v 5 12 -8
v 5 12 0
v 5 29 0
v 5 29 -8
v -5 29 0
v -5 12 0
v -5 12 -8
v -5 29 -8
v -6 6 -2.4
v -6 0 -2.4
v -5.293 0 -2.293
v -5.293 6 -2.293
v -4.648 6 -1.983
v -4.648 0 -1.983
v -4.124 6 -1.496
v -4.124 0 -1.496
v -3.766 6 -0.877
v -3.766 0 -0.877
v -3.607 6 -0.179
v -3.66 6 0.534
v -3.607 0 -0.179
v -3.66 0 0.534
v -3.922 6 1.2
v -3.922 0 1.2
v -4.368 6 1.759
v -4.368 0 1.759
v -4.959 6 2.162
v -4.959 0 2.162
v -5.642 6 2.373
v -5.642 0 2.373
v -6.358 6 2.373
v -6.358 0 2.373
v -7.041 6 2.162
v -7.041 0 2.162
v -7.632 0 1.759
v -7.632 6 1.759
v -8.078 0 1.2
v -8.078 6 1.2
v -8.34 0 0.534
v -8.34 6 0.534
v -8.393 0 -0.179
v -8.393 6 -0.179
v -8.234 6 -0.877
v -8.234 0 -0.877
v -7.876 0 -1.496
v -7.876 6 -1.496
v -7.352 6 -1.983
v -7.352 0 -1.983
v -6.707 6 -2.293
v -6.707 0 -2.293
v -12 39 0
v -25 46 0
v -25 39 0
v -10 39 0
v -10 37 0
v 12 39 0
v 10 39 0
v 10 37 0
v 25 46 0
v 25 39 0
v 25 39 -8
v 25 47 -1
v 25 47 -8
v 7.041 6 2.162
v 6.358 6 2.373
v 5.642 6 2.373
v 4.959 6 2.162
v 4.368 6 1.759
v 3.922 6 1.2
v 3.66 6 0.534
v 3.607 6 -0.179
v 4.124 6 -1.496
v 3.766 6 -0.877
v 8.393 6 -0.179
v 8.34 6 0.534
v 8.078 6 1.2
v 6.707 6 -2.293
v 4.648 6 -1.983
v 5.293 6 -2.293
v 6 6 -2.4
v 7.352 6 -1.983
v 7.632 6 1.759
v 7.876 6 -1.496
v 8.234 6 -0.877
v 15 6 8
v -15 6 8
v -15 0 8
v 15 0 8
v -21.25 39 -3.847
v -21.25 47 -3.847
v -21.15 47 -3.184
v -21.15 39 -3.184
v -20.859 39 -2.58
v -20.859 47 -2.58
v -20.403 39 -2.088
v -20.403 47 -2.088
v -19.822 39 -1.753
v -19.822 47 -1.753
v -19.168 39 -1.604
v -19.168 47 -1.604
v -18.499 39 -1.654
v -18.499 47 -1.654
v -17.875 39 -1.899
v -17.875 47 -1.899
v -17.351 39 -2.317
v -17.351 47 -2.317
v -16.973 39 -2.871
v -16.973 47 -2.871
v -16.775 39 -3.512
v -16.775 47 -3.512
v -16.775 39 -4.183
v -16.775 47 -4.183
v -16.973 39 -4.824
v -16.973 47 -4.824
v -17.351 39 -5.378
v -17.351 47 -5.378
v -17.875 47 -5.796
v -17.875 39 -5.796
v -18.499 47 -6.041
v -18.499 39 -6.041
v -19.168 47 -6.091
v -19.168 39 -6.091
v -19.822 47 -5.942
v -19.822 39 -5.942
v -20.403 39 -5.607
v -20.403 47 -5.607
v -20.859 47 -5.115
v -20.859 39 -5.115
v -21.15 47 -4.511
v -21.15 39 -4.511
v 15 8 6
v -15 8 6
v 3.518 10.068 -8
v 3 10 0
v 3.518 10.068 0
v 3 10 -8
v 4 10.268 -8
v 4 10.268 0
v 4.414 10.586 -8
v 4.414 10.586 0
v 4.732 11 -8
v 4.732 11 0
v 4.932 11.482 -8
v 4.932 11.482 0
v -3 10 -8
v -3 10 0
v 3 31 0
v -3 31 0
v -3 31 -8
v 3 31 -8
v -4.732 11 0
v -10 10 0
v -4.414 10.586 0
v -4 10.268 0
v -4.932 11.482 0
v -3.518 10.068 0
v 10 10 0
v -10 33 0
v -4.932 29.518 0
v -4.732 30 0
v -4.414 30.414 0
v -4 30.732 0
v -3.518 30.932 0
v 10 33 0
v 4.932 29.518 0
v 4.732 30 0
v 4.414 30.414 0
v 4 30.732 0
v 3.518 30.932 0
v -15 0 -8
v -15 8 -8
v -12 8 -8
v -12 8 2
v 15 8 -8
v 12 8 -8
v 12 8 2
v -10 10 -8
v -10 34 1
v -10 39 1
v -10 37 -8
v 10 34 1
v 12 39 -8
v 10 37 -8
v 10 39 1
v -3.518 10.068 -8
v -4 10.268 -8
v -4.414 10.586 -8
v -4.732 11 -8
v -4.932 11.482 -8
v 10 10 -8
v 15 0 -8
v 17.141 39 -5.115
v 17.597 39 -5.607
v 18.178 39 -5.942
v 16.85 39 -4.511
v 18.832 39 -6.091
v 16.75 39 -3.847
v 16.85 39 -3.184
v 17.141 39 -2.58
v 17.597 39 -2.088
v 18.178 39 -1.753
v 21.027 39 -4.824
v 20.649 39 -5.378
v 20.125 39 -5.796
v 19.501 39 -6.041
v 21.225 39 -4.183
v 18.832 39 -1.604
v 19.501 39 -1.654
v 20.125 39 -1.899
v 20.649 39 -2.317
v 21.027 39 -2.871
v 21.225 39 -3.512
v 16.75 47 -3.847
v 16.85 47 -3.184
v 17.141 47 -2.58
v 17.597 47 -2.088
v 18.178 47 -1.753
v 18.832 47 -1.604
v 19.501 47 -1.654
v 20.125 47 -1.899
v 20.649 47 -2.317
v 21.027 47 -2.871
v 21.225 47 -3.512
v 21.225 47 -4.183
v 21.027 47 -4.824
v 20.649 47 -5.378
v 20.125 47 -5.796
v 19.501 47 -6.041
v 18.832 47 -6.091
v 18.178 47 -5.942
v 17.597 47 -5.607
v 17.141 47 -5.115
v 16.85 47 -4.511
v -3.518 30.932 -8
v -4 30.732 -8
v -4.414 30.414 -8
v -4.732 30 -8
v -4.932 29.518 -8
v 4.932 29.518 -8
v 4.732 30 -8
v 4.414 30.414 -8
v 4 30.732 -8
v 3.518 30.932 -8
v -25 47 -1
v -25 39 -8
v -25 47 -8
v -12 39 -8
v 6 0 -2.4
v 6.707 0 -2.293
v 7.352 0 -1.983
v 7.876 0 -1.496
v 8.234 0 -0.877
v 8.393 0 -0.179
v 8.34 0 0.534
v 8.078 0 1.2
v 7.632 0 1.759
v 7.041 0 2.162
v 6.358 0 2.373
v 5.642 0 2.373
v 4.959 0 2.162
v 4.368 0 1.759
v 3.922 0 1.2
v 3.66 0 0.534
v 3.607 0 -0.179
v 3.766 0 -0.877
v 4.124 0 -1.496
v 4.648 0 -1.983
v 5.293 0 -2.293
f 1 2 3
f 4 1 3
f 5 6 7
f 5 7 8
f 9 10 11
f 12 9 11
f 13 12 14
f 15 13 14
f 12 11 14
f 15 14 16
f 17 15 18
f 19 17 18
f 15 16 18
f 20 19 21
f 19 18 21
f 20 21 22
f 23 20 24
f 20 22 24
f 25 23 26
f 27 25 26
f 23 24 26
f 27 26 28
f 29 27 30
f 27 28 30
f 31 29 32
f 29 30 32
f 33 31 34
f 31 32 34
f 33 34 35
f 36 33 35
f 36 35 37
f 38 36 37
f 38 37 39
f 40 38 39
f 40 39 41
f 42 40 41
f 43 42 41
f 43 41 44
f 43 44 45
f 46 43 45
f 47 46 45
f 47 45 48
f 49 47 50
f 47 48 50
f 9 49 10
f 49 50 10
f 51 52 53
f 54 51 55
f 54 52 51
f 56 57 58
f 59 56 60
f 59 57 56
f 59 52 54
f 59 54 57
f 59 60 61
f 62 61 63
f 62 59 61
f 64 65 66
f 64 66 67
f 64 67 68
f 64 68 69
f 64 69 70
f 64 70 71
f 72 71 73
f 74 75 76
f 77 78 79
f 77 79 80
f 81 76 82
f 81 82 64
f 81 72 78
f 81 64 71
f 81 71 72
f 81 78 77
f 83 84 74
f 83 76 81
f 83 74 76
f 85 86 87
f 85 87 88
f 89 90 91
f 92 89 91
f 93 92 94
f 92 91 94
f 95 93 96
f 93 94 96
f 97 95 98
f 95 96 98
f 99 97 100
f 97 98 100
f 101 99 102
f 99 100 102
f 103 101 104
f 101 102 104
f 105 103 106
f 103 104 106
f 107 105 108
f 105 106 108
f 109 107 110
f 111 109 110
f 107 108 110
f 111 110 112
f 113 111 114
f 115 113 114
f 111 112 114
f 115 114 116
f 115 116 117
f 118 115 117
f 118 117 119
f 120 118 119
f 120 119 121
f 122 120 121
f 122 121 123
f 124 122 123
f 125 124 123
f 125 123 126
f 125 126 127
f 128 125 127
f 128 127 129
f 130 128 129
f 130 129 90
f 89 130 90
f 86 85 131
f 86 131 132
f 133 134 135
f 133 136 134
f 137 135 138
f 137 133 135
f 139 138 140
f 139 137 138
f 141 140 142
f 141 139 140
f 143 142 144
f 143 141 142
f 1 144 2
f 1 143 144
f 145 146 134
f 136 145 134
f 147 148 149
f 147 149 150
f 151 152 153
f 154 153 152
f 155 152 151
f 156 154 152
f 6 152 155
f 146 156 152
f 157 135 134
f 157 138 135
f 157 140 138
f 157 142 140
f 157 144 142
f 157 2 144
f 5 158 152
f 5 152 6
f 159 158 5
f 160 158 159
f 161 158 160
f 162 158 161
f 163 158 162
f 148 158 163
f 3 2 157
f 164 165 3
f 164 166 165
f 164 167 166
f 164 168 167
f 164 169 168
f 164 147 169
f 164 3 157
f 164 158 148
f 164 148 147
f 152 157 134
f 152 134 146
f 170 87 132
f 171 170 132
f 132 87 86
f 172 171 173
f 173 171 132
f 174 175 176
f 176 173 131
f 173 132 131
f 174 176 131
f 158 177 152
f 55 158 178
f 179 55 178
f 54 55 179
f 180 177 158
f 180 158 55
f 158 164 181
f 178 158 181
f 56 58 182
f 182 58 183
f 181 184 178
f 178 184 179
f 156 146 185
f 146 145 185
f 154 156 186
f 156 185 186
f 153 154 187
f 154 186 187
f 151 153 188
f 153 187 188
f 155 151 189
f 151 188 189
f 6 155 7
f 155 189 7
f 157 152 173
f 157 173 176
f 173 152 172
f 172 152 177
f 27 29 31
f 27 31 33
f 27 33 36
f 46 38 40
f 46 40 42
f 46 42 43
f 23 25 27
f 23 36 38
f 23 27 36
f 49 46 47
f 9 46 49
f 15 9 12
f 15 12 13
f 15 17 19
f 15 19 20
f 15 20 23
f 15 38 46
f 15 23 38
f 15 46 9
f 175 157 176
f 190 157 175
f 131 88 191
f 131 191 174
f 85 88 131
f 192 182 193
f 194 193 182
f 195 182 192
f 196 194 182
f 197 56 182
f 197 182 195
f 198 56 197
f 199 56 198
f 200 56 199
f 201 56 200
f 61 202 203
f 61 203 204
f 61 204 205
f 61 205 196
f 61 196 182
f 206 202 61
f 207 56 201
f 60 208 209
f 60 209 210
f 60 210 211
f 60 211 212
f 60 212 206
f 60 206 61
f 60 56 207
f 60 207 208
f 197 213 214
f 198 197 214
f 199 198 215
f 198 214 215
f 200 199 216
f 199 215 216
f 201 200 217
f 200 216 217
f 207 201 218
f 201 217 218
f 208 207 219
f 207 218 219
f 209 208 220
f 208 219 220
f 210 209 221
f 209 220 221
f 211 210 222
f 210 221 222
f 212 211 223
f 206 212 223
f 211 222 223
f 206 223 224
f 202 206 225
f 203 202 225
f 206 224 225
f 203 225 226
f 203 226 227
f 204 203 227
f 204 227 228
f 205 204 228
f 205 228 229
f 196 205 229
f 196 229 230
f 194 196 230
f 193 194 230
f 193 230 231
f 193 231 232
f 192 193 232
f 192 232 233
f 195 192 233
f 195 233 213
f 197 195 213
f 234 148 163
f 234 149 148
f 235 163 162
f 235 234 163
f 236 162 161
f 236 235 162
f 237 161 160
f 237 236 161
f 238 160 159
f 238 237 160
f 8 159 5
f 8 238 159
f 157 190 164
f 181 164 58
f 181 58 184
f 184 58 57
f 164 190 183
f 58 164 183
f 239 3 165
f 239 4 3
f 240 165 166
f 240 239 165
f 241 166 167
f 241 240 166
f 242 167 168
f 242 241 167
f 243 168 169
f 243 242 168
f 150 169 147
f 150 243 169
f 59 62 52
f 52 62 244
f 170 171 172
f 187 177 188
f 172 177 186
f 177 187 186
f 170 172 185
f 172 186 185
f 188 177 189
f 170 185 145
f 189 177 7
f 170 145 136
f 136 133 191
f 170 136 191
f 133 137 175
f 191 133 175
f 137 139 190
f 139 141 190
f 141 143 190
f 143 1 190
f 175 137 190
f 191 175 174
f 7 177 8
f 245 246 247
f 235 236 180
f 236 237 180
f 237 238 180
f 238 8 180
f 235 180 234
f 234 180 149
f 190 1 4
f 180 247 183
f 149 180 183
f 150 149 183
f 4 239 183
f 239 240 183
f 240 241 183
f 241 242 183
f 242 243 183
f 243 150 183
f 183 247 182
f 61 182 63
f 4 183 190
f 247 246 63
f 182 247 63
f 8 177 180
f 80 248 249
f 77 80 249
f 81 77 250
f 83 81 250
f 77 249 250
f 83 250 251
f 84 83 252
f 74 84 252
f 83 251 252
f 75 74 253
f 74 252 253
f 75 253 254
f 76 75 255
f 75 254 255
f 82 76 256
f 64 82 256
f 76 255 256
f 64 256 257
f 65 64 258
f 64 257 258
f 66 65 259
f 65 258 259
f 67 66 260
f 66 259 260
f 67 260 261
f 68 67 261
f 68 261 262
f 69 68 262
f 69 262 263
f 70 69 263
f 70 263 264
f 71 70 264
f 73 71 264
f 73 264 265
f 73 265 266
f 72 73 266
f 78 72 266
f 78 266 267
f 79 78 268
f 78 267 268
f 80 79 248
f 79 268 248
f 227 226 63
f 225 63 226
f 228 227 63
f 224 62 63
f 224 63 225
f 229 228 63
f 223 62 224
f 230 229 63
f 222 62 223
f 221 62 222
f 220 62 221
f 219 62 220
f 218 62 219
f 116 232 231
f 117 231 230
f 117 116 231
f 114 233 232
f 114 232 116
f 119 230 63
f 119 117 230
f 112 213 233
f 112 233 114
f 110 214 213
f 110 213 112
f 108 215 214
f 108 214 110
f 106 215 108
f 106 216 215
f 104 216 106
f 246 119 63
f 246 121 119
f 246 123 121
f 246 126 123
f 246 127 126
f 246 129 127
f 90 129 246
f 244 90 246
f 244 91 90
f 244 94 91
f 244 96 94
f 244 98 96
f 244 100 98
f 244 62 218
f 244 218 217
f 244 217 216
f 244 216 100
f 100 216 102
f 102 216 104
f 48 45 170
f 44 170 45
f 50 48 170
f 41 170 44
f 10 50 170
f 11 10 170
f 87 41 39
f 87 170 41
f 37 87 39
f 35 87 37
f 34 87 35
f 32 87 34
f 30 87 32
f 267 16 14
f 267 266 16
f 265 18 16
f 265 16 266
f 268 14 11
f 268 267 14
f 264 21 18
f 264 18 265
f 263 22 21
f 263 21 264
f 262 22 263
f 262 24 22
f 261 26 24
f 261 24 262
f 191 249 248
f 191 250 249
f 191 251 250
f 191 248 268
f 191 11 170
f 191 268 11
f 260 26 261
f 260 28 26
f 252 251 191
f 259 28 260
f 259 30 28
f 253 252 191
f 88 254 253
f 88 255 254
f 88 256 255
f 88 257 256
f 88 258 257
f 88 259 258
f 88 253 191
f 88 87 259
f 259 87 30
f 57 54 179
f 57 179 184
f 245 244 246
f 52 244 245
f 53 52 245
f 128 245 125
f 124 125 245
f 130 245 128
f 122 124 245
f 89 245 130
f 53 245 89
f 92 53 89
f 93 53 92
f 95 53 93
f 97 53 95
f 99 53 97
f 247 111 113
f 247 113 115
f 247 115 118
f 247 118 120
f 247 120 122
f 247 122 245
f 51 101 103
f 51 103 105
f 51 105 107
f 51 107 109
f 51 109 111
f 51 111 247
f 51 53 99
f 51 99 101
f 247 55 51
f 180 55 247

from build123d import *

# Parameters (mm, degrees)
EXTRUDE_1_DEPTH     = 8
SKETCH_3_W          = 20
SKETCH_3_H          = 4
EXTRUDE_2_DEPTH     = 1
SKETCH_4_R          = 2.25
CUT_EXTRUDE_3_DEPTH = 10
CHAMFER_2_SIZE      = 1
CHAMFER_3_SIZE      = 2
CHAMFER_4_SIZE      = 2
SKETCH_6_W          = 20
SKETCH_6_H          = 8
EXTRUDE_3_DEPTH     = 8
SKETCH_7_W          = 10
SKETCH_7_H          = 21
CUT_EXTRUDE_4_DEPTH = 54.833075335
FILLET_1_R          = 2
SKETCH_8_R          = 2.4
CUT_EXTRUDE_5_DEPTH = 6
SKETCH_9_W          = 5
SKETCH_9_H          = 8
EXTRUDE_4_DEPTH     = 16
CHAMFER_5_SIZE      = 2
CHAMFER_6_SIZE      = 2


# Some blends are built 0.0001 mm under size
with BuildPart() as part:
    # ｽｹｯﾁ1 → ﾎﾞｽ - 押し出し1 (new body)
    with BuildSketch(Plane.XY):
        Polygon((-10, 0), (0, 0), (10, 0), (10, 5), (0, 5), (-10, 5), align=None)
        Polygon((0, 5), (10, 5), (10, 39), (-10, 39), (-10, 5), align=None)
        Polygon((-10, 39), (10, 39), (25, 39), (25, 47), (-25, 47), (-25, 39), align=None)
    extrude(amount=-EXTRUDE_1_DEPTH)

    # ｽｹｯﾁ3 → ﾎﾞｽ - 押し出し2 (add)
    with BuildSketch(Plane.XY):
        with Locations((0, 37)):
            Rectangle(SKETCH_3_W, SKETCH_3_H)
    extrude(amount=EXTRUDE_2_DEPTH)

    # ｽｹｯﾁ4 → ｶｯﾄ - 押し出し3 (cut)
    with BuildSketch(Plane(origin=(0, 47, 0), x_dir=(1, 0, 0), z_dir=(0, 1, 0))):
        with Locations(Location((19, 3.847406514, 0), (0, 0, 180))):
            Circle(SKETCH_4_R)
        with Locations(Location((-19, 3.847406514, 0), (0, 0, 180))):
            Circle(SKETCH_4_R)
    extrude(amount=-CUT_EXTRUDE_3_DEPTH, mode=Mode.SUBTRACT)

    # 面取り2
    chamfer_2_edges = [part.edges().sort_by_distance(p)[0] for p in [
        (0, 47, 0),
    ]]
    chamfer(chamfer_2_edges, length=CHAMFER_2_SIZE)

    # 面取り3
    chamfer_3_edges = [part.edges().sort_by_distance(p)[0] for p in [
        (-10, 39, -4),
        (10, 39, -4),
    ]]
    chamfer(chamfer_3_edges, length=CHAMFER_3_SIZE)

    # 面取り4
    # the kernel refuses this chamfer: 2 mm, written as the material it adds along each edge
    with BuildSketch(Plane(origin=(10, 35, 0), x_dir=(0, -0.9996219169112968, -0.02749587661058639), z_dir=(-1, 0, 0))) as chamfer_4_piece_1_section:
        Polygon((CHAMFER_4_SIZE * 0.999621916911, CHAMFER_4_SIZE * 0.0274958766106), (-CHAMFER_4_SIZE * 0.0274958766106, CHAMFER_4_SIZE * 0.999621916911), (0, 0), align=None)
    chamfer_4_piece_1 = extrude(amount=20, mode=Mode.PRIVATE)
    chamfer_4_piece_1 = split(chamfer_4_piece_1, bisect_by=Plane(origin=(0, 34.213197832, 1), z_dir=(0, 0, -1)), keep=Keep.TOP, mode=Mode.PRIVATE)
    add(chamfer_4_piece_1)

    # ｽｹｯﾁ6 → ﾎﾞｽ - 押し出し3 (add)
    with BuildSketch(Plane.XY):
        with Locations((0, 4)):
            Rectangle(SKETCH_6_W, SKETCH_6_H)
    extrude(amount=EXTRUDE_3_DEPTH)

    # ｽｹｯﾁ7 → ｶｯﾄ - 押し出し4 (cut, through all)
    with BuildSketch(Plane.XY):
        with Locations((0, 20.5)):
            Rectangle(SKETCH_7_W, SKETCH_7_H)
    extrude(amount=-CUT_EXTRUDE_4_DEPTH, mode=Mode.SUBTRACT)

    # ﾌｨﾚｯﾄ1
    fillet_1_edges = [part.edges().sort_by_distance(p)[0] for p in [
        (5, 31, -4),
        (5, 10, -4),
        (-5, 10, -4),
        (-5, 31, -4),
    ]]
    fillet(fillet_1_edges, radius=FILLET_1_R)

    # ｽｹｯﾁ8 → ｶｯﾄ - 押し出し5 (cut)
    with BuildSketch(Plane.XZ):
        with Locations(Location((-6, 0, 0), (0, 0, 270))):
            Circle(SKETCH_8_R)
        with Locations(Location((6, 0, 0), (0, 0, 270))):
            Circle(SKETCH_8_R)
    extrude(amount=-CUT_EXTRUDE_5_DEPTH, mode=Mode.SUBTRACT)

    # ｽｹｯﾁ9 → ﾎﾞｽ - 押し出し4 (add)
    with BuildSketch(Plane.XY.offset(8)):
        with Locations((12.5, 4)):
            Rectangle(SKETCH_9_W, SKETCH_9_H)
        with Locations((-12.5, 4)):
            Rectangle(SKETCH_9_W, SKETCH_9_H)
    extrude(amount=-EXTRUDE_4_DEPTH)

    # 面取り5
    chamfer_5_edges = [part.edges().sort_by_distance(p)[0] for p in [
        (0, 8, 8),
    ]]
    chamfer(chamfer_5_edges, length=CHAMFER_5_SIZE)

    # 面取り6
    chamfer_6_edges = [part.edges().sort_by_distance(p)[0] for p in [
        (0, 8, 0),
        (10, 8, -4),
        (-10, 8, -4),
    ]]
    chamfer(chamfer_6_edges, length=CHAMFER_6_SIZE - 0.0001)  # a hair under: the kernel refuses the full size


solid = part.part
